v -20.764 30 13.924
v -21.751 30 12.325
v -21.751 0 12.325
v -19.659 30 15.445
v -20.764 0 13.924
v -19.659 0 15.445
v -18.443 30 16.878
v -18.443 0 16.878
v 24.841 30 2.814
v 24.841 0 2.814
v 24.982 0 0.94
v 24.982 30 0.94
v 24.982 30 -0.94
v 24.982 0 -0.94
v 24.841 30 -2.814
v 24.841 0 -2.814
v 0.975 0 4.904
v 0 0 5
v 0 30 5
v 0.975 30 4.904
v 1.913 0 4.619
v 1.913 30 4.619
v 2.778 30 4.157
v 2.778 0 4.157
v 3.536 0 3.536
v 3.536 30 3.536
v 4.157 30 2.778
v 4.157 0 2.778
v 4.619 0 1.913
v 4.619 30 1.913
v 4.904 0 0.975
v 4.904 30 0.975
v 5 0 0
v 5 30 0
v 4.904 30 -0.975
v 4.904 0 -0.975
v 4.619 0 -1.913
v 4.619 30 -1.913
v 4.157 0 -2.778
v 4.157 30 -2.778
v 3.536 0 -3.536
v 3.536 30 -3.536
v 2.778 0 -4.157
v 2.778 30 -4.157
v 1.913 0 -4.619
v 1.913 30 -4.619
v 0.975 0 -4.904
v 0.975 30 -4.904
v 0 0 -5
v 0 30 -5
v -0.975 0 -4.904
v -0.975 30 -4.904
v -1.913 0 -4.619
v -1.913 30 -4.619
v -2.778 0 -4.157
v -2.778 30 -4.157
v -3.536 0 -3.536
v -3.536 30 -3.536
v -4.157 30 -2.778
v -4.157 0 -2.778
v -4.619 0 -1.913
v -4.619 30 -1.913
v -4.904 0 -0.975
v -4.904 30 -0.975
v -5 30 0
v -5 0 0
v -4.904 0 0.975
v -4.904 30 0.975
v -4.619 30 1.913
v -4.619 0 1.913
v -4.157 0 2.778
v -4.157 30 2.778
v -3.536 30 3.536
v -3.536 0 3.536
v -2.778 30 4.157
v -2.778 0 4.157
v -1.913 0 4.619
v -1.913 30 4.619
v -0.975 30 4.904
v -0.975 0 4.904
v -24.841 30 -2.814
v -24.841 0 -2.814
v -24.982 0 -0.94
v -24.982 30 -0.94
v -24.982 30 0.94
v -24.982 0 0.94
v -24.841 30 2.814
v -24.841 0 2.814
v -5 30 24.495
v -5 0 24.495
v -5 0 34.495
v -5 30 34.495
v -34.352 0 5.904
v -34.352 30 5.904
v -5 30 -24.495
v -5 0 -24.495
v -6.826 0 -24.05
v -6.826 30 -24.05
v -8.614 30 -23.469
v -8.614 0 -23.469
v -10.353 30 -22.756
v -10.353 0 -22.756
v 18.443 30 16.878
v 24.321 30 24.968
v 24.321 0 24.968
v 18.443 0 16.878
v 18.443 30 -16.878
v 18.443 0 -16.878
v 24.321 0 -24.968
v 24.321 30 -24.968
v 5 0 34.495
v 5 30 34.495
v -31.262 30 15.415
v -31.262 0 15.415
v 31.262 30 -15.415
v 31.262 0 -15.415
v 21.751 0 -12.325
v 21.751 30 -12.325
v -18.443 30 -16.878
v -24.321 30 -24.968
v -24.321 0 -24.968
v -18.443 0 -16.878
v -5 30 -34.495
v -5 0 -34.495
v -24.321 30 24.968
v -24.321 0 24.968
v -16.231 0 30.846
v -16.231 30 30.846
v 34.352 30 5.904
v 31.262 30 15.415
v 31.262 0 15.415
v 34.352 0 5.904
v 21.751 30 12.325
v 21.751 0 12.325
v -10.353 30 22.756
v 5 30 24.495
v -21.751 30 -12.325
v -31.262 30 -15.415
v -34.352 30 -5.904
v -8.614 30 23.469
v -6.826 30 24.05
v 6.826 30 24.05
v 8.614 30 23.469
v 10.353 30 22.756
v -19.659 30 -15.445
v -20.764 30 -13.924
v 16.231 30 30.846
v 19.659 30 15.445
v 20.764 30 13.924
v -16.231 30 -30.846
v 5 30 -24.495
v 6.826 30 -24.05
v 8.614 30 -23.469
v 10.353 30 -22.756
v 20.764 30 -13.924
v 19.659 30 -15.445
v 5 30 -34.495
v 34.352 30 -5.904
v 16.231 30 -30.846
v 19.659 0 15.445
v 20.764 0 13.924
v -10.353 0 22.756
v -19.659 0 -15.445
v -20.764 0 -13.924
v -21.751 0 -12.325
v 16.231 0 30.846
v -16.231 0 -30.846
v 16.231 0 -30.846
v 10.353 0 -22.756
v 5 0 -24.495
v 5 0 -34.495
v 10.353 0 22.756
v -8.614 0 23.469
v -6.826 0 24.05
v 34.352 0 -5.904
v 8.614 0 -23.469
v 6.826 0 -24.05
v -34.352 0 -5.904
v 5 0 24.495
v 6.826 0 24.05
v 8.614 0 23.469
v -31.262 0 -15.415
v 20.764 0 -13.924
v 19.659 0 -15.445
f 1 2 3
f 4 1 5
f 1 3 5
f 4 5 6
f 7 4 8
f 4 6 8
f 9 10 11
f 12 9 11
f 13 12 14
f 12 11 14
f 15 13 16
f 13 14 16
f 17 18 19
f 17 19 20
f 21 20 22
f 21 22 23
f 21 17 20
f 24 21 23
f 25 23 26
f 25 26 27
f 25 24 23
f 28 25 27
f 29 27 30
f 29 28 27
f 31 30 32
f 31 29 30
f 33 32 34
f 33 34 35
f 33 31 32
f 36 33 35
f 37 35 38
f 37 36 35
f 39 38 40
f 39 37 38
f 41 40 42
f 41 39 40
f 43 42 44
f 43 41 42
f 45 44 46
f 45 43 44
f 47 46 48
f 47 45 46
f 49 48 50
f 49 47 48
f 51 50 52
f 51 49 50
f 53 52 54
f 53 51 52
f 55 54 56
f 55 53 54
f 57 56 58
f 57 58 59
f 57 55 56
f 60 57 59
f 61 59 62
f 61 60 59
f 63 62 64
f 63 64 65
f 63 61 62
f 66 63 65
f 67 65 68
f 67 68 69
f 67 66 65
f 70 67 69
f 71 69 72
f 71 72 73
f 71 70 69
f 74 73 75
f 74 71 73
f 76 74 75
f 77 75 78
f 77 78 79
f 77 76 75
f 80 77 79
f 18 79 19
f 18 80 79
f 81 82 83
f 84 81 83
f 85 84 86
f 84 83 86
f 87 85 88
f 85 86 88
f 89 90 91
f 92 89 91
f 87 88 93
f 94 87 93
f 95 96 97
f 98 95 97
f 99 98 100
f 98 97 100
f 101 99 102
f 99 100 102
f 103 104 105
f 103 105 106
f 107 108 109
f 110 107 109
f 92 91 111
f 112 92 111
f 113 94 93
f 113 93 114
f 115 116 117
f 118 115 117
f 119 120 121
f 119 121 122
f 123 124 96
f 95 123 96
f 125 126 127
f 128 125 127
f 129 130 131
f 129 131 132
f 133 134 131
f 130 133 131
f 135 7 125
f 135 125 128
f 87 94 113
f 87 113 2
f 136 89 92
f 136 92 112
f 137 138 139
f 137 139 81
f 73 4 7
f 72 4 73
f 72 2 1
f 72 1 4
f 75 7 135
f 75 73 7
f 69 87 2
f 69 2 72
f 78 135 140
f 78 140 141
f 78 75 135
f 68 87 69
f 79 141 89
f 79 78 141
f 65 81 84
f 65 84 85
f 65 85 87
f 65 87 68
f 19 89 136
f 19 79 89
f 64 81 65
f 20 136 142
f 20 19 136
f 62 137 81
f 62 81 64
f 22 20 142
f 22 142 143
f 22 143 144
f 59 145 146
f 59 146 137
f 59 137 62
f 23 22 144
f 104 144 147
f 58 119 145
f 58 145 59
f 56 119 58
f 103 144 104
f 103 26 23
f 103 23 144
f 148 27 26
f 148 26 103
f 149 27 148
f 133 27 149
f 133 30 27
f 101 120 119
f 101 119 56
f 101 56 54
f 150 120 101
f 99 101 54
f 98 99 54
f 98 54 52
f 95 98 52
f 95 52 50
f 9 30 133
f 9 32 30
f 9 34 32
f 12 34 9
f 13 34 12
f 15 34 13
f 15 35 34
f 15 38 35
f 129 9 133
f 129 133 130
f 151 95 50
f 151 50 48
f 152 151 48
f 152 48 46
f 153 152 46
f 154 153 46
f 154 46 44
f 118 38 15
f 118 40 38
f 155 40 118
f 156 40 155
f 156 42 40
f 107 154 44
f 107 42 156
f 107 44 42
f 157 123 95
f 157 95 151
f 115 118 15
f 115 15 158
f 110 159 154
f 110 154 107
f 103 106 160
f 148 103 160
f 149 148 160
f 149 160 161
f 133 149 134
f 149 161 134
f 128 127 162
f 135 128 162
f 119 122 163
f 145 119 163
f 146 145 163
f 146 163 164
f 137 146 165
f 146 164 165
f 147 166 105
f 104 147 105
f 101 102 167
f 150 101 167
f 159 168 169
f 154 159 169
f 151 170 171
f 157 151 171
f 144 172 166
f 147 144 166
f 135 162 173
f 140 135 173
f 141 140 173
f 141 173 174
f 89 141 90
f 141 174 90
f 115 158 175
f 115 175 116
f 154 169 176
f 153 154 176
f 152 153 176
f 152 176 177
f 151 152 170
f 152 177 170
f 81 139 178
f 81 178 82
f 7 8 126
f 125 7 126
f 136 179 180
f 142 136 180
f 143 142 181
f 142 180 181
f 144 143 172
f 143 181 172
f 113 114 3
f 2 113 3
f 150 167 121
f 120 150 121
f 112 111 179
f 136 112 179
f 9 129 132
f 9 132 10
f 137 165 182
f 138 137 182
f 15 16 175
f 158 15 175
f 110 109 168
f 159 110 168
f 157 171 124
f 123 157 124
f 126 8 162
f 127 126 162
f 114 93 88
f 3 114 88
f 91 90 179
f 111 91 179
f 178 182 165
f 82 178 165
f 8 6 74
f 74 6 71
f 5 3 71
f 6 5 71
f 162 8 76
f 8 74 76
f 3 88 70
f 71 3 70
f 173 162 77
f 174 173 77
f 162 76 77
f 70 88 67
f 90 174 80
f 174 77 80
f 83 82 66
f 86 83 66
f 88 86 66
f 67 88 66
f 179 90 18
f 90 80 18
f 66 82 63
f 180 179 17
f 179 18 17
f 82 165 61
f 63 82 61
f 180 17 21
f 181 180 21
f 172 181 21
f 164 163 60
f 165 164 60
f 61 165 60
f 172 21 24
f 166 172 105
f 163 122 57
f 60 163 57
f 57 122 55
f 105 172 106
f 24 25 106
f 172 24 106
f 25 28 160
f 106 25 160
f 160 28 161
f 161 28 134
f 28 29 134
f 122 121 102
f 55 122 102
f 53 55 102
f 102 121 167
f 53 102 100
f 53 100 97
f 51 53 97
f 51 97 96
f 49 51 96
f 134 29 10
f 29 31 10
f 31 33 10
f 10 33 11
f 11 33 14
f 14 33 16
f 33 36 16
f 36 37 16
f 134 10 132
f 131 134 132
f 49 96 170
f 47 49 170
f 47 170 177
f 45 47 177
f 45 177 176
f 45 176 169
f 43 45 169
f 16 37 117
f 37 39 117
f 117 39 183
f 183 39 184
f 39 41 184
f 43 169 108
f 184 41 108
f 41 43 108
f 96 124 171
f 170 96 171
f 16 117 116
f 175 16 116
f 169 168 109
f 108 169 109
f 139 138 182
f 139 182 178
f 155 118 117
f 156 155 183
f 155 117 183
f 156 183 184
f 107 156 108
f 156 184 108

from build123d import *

# Parameters (mm, degrees)
SKETCH_1_R      = 5
EXTRUDE_1_DEPTH = 30


with BuildPart() as part:
    # 草圖1 → 填料-伸長1 (new body)
    with BuildSketch(Plane(origin=(0, 0, 0), x_dir=(1, 0, 0), z_dir=(0, 1, 0))):
        with BuildLine():
            Line((24.320676959, 24.968031977), (16.230507016, 30.8458845))
            Line((16.230507016, 30.8458845), (10.352654493, 22.755714556))
            ThreePointArc((10.352654493, 22.755714556), (7.725424859, 23.776412907), (5, 24.494897428))
            Line((5, 24.494897428), (5, 34.494897428))
            Line((5, 34.494897428), (-5, 34.494897428))
            Line((-5, 34.494897428), (-5, 24.494897428))
            ThreePointArc((-5, 24.494897428), (-7.725424859, 23.776412907), (-10.352654493, 22.755714556))
            Line((-10.352654493, 22.755714556), (-16.230507016, 30.8458845))
            Line((-16.230507016, 30.8458845), (-24.320676959, 24.968031977))
            Line((-24.320676959, 24.968031977), (-18.442824436, 16.877862033))
            ThreePointArc((-18.442824436, 16.877862033), (-20.225424859, 14.694631307), (-21.750946843, 12.324622162))
            Line((-21.750946843, 12.324622162), (-31.261512006, 15.414792106))
            Line((-31.261512006, 15.414792106), (-34.35168195, 5.904226943))
            Line((-34.35168195, 5.904226943), (-24.841116787, 2.814056999))
            ThreePointArc((-24.841116787, 2.814056999), (-25, 0), (-24.841116787, -2.814056999))
            Line((-24.841116787, -2.814056999), (-34.35168195, -5.904226943))
            Line((-34.35168195, -5.904226943), (-31.261512006, -15.414792106))
            Line((-31.261512006, -15.414792106), (-21.750946843, -12.324622162))
            ThreePointArc((-21.750946843, -12.324622162), (-20.225424859, -14.694631307), (-18.442824436, -16.877862033))
            Line((-18.442824436, -16.877862033), (-24.320676959, -24.968031977))
            Line((-24.320676959, -24.968031977), (-16.230507016, -30.8458845))
            Line((-16.230507016, -30.8458845), (-10.352654493, -22.755714556))
            ThreePointArc((-10.352654493, -22.755714556), (-7.725424859, -23.776412907), (-5, -24.494897428))
            Line((-5, -24.494897428), (-5, -34.494897428))
            Line((-5, -34.494897428), (5, -34.494897428))
            Line((5, -34.494897428), (5, -24.494897428))
            ThreePointArc((5, -24.494897428), (7.725424859, -23.776412907), (10.352654493, -22.755714556))
            Line((10.352654493, -22.755714556), (16.230507016, -30.8458845))
            Line((16.230507016, -30.8458845), (24.320676959, -24.968031977))
            Line((24.320676959, -24.968031977), (18.442824436, -16.877862033))
            ThreePointArc((18.442824436, -16.877862033), (20.225424859, -14.694631307), (21.750946843, -12.324622162))
            Line((21.750946843, -12.324622162), (31.261512006, -15.414792106))
            Line((31.261512006, -15.414792106), (34.35168195, -5.904226943))
            Line((34.35168195, -5.904226943), (24.841116787, -2.814056999))
            ThreePointArc((24.841116787, -2.814056999), (25, 0), (24.841116787, 2.814056999))
            Line((24.841116787, 2.814056999), (34.35168195, 5.904226943))
            Line((34.35168195, 5.904226943), (31.261512006, 15.414792106))
            Line((31.261512006, 15.414792106), (21.750946843, 12.324622162))
            ThreePointArc((21.750946843, 12.324622162), (20.225424859, 14.694631307), (18.442824436, 16.877862033))
            Line((18.442824436, 16.877862033), (24.320676959, 24.968031977))
        make_face()
        with Locations(Location((0, 0, 0), (0, 0, 270))):
            Circle(SKETCH_1_R, mode=Mode.SUBTRACT)
    extrude(amount=EXTRUDE_1_DEPTH)


solid = part.part
